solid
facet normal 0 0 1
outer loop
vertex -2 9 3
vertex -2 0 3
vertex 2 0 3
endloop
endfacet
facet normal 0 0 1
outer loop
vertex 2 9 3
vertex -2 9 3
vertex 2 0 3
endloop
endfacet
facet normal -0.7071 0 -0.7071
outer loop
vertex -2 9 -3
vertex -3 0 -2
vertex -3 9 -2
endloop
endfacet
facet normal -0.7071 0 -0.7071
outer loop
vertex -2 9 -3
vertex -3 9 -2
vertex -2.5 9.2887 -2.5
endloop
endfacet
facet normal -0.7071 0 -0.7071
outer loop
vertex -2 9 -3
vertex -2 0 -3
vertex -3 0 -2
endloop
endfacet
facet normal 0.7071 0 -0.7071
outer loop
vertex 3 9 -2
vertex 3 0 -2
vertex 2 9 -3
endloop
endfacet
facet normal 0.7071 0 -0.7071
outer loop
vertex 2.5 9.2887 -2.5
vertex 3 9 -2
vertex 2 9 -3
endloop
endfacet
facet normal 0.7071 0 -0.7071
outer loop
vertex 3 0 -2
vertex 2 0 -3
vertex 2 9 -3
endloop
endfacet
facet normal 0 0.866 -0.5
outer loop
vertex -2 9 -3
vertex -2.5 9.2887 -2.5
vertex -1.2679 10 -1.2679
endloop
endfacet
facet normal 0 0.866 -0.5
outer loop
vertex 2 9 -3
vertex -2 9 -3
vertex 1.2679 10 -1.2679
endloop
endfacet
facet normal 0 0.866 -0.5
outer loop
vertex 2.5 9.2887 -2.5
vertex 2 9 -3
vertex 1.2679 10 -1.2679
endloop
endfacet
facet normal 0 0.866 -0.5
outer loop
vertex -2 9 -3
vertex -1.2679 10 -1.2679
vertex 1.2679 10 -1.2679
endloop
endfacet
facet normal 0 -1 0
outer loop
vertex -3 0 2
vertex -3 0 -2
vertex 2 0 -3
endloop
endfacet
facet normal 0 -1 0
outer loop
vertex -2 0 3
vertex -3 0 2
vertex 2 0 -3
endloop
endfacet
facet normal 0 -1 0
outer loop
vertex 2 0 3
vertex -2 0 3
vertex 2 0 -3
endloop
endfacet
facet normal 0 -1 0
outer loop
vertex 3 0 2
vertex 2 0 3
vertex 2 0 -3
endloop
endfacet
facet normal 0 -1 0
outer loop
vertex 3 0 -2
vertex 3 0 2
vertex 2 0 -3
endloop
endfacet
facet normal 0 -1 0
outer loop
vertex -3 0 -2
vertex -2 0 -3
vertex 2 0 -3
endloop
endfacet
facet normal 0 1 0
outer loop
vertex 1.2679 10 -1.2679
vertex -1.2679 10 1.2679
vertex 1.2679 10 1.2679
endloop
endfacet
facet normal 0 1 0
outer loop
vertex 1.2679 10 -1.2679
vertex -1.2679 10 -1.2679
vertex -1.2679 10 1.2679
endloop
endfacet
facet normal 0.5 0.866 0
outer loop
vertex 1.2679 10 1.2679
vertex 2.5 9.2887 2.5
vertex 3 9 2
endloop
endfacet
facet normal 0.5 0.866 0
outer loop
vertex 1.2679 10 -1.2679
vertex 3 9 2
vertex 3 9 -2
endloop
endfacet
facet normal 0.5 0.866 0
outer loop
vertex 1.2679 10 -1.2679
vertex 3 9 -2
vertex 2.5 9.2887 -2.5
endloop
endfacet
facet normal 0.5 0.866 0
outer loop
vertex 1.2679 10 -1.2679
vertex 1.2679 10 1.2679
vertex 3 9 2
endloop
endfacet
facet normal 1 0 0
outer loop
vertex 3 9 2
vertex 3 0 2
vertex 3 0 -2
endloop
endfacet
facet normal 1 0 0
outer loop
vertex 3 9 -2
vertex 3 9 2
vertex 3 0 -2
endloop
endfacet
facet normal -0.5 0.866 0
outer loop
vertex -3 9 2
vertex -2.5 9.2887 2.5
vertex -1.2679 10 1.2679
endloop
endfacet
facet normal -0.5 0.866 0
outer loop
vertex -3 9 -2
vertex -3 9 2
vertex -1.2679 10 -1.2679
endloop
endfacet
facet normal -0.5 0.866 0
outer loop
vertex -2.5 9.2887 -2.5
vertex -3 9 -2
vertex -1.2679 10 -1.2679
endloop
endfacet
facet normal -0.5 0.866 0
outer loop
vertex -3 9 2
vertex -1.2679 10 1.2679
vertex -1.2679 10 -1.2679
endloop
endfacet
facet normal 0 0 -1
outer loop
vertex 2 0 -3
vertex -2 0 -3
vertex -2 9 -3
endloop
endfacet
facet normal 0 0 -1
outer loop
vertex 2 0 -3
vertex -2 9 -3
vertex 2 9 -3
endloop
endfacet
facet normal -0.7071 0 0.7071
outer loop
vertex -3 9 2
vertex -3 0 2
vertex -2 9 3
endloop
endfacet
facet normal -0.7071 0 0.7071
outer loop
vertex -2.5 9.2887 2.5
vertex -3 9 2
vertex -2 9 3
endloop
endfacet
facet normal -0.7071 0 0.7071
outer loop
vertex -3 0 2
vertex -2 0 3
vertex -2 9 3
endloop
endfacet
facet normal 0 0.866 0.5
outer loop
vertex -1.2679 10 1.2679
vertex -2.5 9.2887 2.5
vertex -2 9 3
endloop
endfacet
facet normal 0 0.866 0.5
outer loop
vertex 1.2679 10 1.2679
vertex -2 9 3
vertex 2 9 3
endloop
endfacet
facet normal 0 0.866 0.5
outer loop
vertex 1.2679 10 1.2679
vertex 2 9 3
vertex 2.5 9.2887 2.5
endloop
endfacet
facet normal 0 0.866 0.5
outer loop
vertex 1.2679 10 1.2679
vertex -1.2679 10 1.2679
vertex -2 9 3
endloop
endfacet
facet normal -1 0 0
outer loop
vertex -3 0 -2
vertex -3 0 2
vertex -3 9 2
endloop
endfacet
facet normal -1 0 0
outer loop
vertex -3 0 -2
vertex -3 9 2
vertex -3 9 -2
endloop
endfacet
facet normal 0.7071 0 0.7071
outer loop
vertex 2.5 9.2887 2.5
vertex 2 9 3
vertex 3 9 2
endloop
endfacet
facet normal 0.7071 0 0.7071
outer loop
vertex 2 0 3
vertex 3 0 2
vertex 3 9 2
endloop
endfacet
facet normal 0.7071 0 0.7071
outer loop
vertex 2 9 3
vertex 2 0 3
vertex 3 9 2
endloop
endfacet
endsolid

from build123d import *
from OCP.BRepFilletAPI import BRepFilletAPI_MakeChamfer

# Parameters (mm, degrees)
SKETCH11_W     = 6
SKETCH11_H     = 6
EXTRUDE8_DEPTH = 10
CHAMFER1_SIZE  = 1
CHAMFER2_SIZE  = 1
CHAMFER3_SIZE  = 1
CHAMFER3_SIZE2 = 1.732050808
CHAMFER4_SIZE  = 1
CHAMFER4_SIZE2 = 1.732050808


with BuildPart() as part:
    # Sketch11 → Extrude8 (new body)
    with BuildSketch(Plane(origin=(0, 0, 0), x_dir=(1, 0, 0), z_dir=(0, 1, 0))):
        Rectangle(SKETCH11_W, SKETCH11_H)
    extrude(amount=EXTRUDE8_DEPTH)

    # Chamfer1
    chamfer1_edges = [part.edges().sort_by_distance(p)[0] for p in [
        (3, 5, -3),
        (-3, 5, 3),
    ]]
    chamfer(chamfer1_edges, length=CHAMFER1_SIZE)

    # Chamfer2
    chamfer2_edges = [part.edges().sort_by_distance(p)[0] for p in [
        (-3, 5, -3),
        (3, 5, 3),
    ]]
    chamfer(chamfer2_edges, length=CHAMFER2_SIZE)

    # Chamfer3: one chamfer whose edges measure the first distance from different faces: ONE call of the kernel's chamfer builder (chamfer() names one face for all edges)
    chamfer3_edges_1 = [part.edges().sort_by_distance(p)[0] for p in [
        (0, 10, 3),
    ]]
    chamfer3_side_1 = [part.faces().sort_by_distance(p)[0] for p in [
        (0, 5, 3),
    ]]
    chamfer3_edges_2 = [part.edges().sort_by_distance(p)[0] for p in [
        (0, 10, -3),
    ]]
    chamfer3_side_2 = [part.faces().sort_by_distance(p)[0] for p in [
        (0, 5, -3),
    ]]
    chamfer3 = BRepFilletAPI_MakeChamfer(part.part.solid().wrapped)
    for e in chamfer3_edges_1:
        chamfer3.Add(CHAMFER3_SIZE, CHAMFER3_SIZE2, e.wrapped, chamfer3_side_1[0].wrapped)  # the first distance lies on this face
    for e in chamfer3_edges_2:
        chamfer3.Add(CHAMFER3_SIZE, CHAMFER3_SIZE2, e.wrapped, chamfer3_side_2[0].wrapped)  # the first distance lies on this face
    add(Compound.cast(chamfer3.Shape()), mode=Mode.REPLACE)

    # Chamfer4: one chamfer whose edges measure the first distance from different faces: ONE call of the kernel's chamfer builder (chamfer() names one face for all edges)
    chamfer4_edges_1 = [part.edges().sort_by_distance(p)[0] for p in [
        (3, 10, 0),
    ]]
    chamfer4_side_1 = [part.faces().sort_by_distance(p)[0] for p in [
        (3, 4.962121611, 0),
    ]]
    chamfer4_edges_2 = [part.edges().sort_by_distance(p)[0] for p in [
        (-3, 10, 0),
    ]]
    chamfer4_side_2 = [part.faces().sort_by_distance(p)[0] for p in [
        (-3, 4.962121611, 0),
    ]]
    chamfer4 = BRepFilletAPI_MakeChamfer(part.part.solid().wrapped)
    for e in chamfer4_edges_1:
        chamfer4.Add(CHAMFER4_SIZE, CHAMFER4_SIZE2, e.wrapped, chamfer4_side_1[0].wrapped)  # the first distance lies on this face
    for e in chamfer4_edges_2:
        chamfer4.Add(CHAMFER4_SIZE, CHAMFER4_SIZE2, e.wrapped, chamfer4_side_2[0].wrapped)  # the first distance lies on this face
    add(Compound.cast(chamfer4.Shape()), mode=Mode.REPLACE)


solid = part.part
